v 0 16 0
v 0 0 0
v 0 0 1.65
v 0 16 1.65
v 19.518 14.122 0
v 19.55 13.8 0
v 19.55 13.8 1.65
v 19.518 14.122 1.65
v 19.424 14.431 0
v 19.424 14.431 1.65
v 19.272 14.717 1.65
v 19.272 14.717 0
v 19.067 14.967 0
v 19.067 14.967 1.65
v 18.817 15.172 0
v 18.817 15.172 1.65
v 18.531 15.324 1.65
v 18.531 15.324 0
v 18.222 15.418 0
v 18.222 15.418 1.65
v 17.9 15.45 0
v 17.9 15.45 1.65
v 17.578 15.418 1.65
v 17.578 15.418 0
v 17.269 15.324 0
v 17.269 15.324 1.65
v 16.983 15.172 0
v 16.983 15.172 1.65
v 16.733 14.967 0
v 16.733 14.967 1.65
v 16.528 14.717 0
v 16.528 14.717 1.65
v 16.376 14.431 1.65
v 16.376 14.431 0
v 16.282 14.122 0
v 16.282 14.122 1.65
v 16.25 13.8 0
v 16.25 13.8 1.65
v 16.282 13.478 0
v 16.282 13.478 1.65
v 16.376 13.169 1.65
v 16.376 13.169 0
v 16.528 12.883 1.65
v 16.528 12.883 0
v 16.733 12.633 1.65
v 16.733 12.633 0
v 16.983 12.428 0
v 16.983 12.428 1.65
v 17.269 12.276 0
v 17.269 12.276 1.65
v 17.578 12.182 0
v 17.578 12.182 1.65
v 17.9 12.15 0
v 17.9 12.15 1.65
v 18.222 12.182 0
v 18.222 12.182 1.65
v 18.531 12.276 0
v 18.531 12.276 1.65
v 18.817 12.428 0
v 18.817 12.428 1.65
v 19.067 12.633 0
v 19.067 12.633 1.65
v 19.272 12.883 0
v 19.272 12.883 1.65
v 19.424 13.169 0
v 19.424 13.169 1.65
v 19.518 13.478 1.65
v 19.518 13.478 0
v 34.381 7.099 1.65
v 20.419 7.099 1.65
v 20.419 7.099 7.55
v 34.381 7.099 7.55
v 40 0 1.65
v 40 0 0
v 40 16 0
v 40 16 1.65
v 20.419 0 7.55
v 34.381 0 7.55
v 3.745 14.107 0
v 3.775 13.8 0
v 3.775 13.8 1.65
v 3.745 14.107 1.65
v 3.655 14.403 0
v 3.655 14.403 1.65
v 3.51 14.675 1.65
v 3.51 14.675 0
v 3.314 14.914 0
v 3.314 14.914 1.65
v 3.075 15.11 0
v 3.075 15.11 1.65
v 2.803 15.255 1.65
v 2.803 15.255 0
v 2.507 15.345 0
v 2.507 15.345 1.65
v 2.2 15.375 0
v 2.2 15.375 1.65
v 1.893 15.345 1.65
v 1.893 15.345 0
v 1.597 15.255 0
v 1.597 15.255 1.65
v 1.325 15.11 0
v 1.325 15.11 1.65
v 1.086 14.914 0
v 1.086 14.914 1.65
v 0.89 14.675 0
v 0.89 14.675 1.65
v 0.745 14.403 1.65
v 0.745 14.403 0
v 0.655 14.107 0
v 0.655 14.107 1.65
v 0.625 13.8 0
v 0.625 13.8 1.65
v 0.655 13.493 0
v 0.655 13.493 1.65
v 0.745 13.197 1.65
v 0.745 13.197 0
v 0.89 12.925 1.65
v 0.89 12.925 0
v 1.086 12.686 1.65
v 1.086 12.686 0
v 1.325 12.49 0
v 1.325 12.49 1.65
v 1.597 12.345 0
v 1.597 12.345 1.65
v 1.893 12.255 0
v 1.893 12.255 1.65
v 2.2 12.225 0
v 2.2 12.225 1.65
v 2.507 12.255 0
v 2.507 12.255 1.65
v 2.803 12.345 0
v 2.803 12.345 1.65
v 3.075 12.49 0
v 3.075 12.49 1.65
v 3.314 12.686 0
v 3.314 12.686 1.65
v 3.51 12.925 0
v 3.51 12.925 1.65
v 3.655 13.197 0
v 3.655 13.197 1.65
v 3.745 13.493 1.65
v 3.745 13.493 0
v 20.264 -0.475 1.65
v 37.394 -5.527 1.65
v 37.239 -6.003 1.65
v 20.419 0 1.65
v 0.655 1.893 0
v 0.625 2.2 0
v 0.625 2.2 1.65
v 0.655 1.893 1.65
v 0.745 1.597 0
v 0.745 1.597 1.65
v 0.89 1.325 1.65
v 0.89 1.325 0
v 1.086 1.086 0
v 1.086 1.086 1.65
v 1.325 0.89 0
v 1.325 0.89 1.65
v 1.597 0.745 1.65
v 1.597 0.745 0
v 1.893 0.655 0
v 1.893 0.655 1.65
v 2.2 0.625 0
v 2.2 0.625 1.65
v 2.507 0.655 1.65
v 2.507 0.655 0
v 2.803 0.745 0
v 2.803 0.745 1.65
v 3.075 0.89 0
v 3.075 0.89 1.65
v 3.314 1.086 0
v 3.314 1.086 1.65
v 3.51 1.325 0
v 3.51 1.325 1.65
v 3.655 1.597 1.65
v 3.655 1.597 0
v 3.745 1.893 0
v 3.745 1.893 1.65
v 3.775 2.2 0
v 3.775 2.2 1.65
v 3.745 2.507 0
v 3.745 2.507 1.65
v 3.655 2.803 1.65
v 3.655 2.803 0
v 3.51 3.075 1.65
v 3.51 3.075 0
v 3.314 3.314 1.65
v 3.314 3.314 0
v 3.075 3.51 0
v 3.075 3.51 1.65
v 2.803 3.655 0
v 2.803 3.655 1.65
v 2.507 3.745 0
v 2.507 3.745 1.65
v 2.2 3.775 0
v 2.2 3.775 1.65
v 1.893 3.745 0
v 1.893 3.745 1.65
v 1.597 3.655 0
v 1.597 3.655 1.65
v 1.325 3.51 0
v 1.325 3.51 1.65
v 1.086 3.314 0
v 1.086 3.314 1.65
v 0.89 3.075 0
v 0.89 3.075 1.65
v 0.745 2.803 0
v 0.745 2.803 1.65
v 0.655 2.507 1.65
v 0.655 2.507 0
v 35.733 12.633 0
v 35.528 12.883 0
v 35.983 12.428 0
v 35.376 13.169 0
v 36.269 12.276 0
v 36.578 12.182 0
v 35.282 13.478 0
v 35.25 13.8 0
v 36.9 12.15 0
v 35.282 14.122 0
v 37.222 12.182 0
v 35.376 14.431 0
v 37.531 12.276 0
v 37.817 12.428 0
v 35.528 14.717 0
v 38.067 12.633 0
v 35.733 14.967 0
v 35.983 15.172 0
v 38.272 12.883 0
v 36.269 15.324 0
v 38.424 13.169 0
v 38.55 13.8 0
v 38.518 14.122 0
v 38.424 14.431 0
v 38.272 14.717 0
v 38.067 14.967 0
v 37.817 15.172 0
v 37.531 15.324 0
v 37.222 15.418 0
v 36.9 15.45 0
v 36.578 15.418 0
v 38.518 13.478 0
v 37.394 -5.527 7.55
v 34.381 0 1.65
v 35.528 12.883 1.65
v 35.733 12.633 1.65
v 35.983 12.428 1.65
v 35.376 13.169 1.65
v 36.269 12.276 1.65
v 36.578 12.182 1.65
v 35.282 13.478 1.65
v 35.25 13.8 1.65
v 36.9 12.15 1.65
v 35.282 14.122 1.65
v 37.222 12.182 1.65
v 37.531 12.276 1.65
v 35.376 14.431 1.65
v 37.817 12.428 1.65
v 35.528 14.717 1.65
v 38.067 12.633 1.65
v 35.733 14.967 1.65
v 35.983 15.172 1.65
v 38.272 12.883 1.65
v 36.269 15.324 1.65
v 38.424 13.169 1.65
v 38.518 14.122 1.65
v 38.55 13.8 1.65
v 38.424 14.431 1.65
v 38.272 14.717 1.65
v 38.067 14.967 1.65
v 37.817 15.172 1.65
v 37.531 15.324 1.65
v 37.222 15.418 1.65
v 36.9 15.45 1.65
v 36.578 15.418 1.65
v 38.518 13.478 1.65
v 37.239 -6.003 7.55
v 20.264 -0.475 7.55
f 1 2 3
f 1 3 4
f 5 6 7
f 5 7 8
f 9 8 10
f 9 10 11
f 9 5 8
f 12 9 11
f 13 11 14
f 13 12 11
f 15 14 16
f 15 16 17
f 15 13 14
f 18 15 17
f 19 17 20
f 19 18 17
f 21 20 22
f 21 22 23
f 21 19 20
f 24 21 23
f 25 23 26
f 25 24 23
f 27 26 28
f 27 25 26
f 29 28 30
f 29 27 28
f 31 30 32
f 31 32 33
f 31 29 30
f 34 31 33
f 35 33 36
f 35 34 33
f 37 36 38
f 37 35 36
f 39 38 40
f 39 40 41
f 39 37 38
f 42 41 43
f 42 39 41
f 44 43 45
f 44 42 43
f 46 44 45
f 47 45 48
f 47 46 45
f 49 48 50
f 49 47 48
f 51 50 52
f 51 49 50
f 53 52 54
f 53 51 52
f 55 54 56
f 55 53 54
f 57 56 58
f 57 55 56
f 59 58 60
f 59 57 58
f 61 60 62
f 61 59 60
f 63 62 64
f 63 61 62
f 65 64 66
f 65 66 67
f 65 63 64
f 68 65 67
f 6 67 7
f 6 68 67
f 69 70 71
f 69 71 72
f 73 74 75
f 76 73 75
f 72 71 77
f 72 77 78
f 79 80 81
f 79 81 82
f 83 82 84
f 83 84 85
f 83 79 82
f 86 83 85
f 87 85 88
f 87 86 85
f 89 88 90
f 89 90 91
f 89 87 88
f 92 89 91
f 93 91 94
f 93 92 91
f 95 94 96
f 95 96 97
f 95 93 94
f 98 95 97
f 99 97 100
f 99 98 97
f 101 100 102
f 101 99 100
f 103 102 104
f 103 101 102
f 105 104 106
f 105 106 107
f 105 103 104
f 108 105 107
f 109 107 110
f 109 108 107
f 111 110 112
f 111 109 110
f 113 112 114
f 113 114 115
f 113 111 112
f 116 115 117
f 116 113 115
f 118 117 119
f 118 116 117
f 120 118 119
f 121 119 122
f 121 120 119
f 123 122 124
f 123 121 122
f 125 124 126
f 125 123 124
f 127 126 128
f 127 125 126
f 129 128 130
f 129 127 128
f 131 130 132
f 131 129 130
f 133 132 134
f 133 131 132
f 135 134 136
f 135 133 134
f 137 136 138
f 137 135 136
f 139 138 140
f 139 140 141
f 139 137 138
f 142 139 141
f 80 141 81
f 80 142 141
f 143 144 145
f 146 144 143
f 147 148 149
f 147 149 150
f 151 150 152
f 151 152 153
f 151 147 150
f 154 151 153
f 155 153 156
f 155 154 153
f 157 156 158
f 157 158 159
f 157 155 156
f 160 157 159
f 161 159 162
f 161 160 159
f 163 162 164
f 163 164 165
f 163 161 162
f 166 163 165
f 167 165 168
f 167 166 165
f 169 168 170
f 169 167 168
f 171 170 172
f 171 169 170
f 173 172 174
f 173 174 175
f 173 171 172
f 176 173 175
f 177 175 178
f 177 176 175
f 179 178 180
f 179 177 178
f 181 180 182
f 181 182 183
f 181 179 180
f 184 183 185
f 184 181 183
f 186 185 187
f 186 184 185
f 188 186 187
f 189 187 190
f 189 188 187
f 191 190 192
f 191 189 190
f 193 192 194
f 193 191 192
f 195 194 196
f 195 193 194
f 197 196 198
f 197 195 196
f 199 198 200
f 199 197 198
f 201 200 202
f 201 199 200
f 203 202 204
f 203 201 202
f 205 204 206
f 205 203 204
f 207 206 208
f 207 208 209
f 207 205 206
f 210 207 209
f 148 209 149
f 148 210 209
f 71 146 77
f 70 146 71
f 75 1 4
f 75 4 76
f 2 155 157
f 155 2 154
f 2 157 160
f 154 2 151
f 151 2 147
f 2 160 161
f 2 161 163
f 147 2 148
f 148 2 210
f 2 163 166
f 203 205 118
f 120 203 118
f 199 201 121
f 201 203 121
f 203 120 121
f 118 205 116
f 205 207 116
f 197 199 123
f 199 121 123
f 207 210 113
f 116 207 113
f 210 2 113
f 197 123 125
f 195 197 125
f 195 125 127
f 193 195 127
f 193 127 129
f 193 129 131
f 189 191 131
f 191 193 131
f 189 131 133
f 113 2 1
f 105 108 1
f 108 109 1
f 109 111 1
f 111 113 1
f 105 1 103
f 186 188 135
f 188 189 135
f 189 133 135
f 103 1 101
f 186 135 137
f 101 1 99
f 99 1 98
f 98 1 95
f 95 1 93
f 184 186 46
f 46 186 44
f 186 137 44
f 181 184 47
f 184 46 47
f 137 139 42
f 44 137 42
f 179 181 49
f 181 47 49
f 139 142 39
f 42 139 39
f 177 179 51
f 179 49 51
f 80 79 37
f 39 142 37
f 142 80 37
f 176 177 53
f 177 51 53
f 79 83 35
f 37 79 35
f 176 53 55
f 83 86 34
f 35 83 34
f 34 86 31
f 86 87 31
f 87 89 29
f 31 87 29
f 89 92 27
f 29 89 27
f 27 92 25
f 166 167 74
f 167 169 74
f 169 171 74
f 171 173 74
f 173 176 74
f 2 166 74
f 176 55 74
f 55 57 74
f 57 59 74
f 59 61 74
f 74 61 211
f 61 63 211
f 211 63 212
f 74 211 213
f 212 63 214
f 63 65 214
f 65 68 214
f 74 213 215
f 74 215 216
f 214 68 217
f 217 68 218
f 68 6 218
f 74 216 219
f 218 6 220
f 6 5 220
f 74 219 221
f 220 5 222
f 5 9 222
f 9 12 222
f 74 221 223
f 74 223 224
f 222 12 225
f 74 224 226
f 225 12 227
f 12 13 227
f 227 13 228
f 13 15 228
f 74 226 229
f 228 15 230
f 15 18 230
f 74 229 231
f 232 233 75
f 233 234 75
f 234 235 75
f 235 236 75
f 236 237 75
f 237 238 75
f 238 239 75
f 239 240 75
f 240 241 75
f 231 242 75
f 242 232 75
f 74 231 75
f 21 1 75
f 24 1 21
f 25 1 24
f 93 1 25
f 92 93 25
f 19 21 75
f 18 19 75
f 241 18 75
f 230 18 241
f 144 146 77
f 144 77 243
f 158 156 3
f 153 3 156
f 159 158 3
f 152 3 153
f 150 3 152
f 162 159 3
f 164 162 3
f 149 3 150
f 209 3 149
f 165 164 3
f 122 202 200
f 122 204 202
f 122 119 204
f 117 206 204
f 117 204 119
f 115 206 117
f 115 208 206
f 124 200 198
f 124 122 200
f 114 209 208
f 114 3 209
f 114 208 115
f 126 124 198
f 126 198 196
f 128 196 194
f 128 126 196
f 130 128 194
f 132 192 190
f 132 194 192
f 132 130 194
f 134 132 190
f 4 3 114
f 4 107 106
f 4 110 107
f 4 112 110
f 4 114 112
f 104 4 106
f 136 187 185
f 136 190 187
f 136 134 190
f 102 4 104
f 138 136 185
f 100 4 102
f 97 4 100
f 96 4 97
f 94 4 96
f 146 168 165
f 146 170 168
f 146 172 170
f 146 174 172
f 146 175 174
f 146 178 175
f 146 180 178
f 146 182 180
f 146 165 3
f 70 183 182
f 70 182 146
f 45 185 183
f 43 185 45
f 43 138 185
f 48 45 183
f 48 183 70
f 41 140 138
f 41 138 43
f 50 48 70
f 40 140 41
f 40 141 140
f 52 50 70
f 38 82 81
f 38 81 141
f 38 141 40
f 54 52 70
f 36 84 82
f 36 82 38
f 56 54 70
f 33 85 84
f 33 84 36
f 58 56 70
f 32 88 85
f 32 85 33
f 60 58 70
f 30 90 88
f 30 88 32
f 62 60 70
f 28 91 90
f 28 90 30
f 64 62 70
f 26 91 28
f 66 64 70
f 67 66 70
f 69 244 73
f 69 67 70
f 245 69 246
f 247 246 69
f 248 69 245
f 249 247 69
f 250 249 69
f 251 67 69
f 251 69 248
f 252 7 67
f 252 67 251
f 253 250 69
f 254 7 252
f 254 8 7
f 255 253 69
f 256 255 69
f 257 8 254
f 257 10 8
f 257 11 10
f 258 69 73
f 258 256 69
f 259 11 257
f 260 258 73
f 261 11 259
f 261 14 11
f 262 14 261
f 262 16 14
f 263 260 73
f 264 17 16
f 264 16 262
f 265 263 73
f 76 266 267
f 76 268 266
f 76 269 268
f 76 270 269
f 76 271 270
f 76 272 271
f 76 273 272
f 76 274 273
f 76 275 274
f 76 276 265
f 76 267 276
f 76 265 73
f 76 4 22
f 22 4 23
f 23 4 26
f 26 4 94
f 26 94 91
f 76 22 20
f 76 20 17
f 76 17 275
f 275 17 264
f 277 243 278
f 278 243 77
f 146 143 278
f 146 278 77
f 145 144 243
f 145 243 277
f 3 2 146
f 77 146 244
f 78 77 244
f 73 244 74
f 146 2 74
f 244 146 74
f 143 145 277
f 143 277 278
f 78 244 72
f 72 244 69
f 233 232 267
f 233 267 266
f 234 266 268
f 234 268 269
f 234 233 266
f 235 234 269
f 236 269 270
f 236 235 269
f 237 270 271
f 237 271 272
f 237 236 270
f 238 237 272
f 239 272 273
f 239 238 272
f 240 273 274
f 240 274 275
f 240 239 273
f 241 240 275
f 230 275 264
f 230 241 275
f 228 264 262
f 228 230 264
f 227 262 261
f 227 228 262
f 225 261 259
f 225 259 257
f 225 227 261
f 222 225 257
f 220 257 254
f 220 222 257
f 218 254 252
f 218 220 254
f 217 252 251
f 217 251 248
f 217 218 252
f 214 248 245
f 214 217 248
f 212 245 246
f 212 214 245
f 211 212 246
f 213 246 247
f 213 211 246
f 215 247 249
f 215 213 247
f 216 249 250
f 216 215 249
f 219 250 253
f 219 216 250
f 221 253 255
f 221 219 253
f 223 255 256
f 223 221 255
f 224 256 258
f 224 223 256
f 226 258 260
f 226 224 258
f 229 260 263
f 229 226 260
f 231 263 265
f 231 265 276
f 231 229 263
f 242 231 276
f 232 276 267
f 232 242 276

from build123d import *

# Parameters (mm, degrees)
SCHIZZO1_W                   = 40
SCHIZZO1_H                   = 16
SCHIZZO1_R                   = 1.65
SCHIZZO1_R_2                 = 1.575
ESTRUSIONE_ESTRUSIONE1_DEPTH = 1.65
SCHIZZO2_W                   = 13.961540804
SCHIZZO2_H                   = 7.099301817
ESTRUSIONE_ESTRUSIONE2_DEPTH = 5.9
ESTRUSIONE_SOTTILE1_DEPTH    = 5.9


with BuildPart() as part:
    # Schizzo1 → Estrusione-Estrusione1 (new body)
    with BuildSketch(Plane.XY):
        with Locations((20, 8)):
            Rectangle(SCHIZZO1_W, SCHIZZO1_H)
        with Locations((36.9, 13.8)):
            Circle(SCHIZZO1_R, mode=Mode.SUBTRACT)
        with Locations((17.9, 13.8)):
            Circle(SCHIZZO1_R, mode=Mode.SUBTRACT)
        with Locations((2.2, 13.8)):
            Circle(SCHIZZO1_R_2, mode=Mode.SUBTRACT)
        with Locations(Location((2.2, 2.2, 0), (0, 0, 180))):
            Circle(SCHIZZO1_R_2, mode=Mode.SUBTRACT)
    extrude(amount=ESTRUSIONE_ESTRUSIONE1_DEPTH)

    # Schizzo2 → Estrusione-Estrusione2 (add)
    with BuildSketch(Plane.XY.offset(1.65)):
        with Locations((27.4, 3.549650909)):
            Rectangle(SCHIZZO2_W, SCHIZZO2_H)
    extrude(amount=ESTRUSIONE_ESTRUSIONE2_DEPTH)


with BuildPart() as body_2:
    # Schizzo3 → Estrusione-Sottile1 (new body)
    with BuildSketch(Plane.XY.offset(1.65)):
        Polygon((20.419229598, 0), (37.394068881, -5.527143905), (37.23926441, -6.002575893), (20.264425127, -0.475431989), align=None)
    extrude(amount=ESTRUSIONE_SOTTILE1_DEPTH)


solid = Compound([part.part, body_2.part])
